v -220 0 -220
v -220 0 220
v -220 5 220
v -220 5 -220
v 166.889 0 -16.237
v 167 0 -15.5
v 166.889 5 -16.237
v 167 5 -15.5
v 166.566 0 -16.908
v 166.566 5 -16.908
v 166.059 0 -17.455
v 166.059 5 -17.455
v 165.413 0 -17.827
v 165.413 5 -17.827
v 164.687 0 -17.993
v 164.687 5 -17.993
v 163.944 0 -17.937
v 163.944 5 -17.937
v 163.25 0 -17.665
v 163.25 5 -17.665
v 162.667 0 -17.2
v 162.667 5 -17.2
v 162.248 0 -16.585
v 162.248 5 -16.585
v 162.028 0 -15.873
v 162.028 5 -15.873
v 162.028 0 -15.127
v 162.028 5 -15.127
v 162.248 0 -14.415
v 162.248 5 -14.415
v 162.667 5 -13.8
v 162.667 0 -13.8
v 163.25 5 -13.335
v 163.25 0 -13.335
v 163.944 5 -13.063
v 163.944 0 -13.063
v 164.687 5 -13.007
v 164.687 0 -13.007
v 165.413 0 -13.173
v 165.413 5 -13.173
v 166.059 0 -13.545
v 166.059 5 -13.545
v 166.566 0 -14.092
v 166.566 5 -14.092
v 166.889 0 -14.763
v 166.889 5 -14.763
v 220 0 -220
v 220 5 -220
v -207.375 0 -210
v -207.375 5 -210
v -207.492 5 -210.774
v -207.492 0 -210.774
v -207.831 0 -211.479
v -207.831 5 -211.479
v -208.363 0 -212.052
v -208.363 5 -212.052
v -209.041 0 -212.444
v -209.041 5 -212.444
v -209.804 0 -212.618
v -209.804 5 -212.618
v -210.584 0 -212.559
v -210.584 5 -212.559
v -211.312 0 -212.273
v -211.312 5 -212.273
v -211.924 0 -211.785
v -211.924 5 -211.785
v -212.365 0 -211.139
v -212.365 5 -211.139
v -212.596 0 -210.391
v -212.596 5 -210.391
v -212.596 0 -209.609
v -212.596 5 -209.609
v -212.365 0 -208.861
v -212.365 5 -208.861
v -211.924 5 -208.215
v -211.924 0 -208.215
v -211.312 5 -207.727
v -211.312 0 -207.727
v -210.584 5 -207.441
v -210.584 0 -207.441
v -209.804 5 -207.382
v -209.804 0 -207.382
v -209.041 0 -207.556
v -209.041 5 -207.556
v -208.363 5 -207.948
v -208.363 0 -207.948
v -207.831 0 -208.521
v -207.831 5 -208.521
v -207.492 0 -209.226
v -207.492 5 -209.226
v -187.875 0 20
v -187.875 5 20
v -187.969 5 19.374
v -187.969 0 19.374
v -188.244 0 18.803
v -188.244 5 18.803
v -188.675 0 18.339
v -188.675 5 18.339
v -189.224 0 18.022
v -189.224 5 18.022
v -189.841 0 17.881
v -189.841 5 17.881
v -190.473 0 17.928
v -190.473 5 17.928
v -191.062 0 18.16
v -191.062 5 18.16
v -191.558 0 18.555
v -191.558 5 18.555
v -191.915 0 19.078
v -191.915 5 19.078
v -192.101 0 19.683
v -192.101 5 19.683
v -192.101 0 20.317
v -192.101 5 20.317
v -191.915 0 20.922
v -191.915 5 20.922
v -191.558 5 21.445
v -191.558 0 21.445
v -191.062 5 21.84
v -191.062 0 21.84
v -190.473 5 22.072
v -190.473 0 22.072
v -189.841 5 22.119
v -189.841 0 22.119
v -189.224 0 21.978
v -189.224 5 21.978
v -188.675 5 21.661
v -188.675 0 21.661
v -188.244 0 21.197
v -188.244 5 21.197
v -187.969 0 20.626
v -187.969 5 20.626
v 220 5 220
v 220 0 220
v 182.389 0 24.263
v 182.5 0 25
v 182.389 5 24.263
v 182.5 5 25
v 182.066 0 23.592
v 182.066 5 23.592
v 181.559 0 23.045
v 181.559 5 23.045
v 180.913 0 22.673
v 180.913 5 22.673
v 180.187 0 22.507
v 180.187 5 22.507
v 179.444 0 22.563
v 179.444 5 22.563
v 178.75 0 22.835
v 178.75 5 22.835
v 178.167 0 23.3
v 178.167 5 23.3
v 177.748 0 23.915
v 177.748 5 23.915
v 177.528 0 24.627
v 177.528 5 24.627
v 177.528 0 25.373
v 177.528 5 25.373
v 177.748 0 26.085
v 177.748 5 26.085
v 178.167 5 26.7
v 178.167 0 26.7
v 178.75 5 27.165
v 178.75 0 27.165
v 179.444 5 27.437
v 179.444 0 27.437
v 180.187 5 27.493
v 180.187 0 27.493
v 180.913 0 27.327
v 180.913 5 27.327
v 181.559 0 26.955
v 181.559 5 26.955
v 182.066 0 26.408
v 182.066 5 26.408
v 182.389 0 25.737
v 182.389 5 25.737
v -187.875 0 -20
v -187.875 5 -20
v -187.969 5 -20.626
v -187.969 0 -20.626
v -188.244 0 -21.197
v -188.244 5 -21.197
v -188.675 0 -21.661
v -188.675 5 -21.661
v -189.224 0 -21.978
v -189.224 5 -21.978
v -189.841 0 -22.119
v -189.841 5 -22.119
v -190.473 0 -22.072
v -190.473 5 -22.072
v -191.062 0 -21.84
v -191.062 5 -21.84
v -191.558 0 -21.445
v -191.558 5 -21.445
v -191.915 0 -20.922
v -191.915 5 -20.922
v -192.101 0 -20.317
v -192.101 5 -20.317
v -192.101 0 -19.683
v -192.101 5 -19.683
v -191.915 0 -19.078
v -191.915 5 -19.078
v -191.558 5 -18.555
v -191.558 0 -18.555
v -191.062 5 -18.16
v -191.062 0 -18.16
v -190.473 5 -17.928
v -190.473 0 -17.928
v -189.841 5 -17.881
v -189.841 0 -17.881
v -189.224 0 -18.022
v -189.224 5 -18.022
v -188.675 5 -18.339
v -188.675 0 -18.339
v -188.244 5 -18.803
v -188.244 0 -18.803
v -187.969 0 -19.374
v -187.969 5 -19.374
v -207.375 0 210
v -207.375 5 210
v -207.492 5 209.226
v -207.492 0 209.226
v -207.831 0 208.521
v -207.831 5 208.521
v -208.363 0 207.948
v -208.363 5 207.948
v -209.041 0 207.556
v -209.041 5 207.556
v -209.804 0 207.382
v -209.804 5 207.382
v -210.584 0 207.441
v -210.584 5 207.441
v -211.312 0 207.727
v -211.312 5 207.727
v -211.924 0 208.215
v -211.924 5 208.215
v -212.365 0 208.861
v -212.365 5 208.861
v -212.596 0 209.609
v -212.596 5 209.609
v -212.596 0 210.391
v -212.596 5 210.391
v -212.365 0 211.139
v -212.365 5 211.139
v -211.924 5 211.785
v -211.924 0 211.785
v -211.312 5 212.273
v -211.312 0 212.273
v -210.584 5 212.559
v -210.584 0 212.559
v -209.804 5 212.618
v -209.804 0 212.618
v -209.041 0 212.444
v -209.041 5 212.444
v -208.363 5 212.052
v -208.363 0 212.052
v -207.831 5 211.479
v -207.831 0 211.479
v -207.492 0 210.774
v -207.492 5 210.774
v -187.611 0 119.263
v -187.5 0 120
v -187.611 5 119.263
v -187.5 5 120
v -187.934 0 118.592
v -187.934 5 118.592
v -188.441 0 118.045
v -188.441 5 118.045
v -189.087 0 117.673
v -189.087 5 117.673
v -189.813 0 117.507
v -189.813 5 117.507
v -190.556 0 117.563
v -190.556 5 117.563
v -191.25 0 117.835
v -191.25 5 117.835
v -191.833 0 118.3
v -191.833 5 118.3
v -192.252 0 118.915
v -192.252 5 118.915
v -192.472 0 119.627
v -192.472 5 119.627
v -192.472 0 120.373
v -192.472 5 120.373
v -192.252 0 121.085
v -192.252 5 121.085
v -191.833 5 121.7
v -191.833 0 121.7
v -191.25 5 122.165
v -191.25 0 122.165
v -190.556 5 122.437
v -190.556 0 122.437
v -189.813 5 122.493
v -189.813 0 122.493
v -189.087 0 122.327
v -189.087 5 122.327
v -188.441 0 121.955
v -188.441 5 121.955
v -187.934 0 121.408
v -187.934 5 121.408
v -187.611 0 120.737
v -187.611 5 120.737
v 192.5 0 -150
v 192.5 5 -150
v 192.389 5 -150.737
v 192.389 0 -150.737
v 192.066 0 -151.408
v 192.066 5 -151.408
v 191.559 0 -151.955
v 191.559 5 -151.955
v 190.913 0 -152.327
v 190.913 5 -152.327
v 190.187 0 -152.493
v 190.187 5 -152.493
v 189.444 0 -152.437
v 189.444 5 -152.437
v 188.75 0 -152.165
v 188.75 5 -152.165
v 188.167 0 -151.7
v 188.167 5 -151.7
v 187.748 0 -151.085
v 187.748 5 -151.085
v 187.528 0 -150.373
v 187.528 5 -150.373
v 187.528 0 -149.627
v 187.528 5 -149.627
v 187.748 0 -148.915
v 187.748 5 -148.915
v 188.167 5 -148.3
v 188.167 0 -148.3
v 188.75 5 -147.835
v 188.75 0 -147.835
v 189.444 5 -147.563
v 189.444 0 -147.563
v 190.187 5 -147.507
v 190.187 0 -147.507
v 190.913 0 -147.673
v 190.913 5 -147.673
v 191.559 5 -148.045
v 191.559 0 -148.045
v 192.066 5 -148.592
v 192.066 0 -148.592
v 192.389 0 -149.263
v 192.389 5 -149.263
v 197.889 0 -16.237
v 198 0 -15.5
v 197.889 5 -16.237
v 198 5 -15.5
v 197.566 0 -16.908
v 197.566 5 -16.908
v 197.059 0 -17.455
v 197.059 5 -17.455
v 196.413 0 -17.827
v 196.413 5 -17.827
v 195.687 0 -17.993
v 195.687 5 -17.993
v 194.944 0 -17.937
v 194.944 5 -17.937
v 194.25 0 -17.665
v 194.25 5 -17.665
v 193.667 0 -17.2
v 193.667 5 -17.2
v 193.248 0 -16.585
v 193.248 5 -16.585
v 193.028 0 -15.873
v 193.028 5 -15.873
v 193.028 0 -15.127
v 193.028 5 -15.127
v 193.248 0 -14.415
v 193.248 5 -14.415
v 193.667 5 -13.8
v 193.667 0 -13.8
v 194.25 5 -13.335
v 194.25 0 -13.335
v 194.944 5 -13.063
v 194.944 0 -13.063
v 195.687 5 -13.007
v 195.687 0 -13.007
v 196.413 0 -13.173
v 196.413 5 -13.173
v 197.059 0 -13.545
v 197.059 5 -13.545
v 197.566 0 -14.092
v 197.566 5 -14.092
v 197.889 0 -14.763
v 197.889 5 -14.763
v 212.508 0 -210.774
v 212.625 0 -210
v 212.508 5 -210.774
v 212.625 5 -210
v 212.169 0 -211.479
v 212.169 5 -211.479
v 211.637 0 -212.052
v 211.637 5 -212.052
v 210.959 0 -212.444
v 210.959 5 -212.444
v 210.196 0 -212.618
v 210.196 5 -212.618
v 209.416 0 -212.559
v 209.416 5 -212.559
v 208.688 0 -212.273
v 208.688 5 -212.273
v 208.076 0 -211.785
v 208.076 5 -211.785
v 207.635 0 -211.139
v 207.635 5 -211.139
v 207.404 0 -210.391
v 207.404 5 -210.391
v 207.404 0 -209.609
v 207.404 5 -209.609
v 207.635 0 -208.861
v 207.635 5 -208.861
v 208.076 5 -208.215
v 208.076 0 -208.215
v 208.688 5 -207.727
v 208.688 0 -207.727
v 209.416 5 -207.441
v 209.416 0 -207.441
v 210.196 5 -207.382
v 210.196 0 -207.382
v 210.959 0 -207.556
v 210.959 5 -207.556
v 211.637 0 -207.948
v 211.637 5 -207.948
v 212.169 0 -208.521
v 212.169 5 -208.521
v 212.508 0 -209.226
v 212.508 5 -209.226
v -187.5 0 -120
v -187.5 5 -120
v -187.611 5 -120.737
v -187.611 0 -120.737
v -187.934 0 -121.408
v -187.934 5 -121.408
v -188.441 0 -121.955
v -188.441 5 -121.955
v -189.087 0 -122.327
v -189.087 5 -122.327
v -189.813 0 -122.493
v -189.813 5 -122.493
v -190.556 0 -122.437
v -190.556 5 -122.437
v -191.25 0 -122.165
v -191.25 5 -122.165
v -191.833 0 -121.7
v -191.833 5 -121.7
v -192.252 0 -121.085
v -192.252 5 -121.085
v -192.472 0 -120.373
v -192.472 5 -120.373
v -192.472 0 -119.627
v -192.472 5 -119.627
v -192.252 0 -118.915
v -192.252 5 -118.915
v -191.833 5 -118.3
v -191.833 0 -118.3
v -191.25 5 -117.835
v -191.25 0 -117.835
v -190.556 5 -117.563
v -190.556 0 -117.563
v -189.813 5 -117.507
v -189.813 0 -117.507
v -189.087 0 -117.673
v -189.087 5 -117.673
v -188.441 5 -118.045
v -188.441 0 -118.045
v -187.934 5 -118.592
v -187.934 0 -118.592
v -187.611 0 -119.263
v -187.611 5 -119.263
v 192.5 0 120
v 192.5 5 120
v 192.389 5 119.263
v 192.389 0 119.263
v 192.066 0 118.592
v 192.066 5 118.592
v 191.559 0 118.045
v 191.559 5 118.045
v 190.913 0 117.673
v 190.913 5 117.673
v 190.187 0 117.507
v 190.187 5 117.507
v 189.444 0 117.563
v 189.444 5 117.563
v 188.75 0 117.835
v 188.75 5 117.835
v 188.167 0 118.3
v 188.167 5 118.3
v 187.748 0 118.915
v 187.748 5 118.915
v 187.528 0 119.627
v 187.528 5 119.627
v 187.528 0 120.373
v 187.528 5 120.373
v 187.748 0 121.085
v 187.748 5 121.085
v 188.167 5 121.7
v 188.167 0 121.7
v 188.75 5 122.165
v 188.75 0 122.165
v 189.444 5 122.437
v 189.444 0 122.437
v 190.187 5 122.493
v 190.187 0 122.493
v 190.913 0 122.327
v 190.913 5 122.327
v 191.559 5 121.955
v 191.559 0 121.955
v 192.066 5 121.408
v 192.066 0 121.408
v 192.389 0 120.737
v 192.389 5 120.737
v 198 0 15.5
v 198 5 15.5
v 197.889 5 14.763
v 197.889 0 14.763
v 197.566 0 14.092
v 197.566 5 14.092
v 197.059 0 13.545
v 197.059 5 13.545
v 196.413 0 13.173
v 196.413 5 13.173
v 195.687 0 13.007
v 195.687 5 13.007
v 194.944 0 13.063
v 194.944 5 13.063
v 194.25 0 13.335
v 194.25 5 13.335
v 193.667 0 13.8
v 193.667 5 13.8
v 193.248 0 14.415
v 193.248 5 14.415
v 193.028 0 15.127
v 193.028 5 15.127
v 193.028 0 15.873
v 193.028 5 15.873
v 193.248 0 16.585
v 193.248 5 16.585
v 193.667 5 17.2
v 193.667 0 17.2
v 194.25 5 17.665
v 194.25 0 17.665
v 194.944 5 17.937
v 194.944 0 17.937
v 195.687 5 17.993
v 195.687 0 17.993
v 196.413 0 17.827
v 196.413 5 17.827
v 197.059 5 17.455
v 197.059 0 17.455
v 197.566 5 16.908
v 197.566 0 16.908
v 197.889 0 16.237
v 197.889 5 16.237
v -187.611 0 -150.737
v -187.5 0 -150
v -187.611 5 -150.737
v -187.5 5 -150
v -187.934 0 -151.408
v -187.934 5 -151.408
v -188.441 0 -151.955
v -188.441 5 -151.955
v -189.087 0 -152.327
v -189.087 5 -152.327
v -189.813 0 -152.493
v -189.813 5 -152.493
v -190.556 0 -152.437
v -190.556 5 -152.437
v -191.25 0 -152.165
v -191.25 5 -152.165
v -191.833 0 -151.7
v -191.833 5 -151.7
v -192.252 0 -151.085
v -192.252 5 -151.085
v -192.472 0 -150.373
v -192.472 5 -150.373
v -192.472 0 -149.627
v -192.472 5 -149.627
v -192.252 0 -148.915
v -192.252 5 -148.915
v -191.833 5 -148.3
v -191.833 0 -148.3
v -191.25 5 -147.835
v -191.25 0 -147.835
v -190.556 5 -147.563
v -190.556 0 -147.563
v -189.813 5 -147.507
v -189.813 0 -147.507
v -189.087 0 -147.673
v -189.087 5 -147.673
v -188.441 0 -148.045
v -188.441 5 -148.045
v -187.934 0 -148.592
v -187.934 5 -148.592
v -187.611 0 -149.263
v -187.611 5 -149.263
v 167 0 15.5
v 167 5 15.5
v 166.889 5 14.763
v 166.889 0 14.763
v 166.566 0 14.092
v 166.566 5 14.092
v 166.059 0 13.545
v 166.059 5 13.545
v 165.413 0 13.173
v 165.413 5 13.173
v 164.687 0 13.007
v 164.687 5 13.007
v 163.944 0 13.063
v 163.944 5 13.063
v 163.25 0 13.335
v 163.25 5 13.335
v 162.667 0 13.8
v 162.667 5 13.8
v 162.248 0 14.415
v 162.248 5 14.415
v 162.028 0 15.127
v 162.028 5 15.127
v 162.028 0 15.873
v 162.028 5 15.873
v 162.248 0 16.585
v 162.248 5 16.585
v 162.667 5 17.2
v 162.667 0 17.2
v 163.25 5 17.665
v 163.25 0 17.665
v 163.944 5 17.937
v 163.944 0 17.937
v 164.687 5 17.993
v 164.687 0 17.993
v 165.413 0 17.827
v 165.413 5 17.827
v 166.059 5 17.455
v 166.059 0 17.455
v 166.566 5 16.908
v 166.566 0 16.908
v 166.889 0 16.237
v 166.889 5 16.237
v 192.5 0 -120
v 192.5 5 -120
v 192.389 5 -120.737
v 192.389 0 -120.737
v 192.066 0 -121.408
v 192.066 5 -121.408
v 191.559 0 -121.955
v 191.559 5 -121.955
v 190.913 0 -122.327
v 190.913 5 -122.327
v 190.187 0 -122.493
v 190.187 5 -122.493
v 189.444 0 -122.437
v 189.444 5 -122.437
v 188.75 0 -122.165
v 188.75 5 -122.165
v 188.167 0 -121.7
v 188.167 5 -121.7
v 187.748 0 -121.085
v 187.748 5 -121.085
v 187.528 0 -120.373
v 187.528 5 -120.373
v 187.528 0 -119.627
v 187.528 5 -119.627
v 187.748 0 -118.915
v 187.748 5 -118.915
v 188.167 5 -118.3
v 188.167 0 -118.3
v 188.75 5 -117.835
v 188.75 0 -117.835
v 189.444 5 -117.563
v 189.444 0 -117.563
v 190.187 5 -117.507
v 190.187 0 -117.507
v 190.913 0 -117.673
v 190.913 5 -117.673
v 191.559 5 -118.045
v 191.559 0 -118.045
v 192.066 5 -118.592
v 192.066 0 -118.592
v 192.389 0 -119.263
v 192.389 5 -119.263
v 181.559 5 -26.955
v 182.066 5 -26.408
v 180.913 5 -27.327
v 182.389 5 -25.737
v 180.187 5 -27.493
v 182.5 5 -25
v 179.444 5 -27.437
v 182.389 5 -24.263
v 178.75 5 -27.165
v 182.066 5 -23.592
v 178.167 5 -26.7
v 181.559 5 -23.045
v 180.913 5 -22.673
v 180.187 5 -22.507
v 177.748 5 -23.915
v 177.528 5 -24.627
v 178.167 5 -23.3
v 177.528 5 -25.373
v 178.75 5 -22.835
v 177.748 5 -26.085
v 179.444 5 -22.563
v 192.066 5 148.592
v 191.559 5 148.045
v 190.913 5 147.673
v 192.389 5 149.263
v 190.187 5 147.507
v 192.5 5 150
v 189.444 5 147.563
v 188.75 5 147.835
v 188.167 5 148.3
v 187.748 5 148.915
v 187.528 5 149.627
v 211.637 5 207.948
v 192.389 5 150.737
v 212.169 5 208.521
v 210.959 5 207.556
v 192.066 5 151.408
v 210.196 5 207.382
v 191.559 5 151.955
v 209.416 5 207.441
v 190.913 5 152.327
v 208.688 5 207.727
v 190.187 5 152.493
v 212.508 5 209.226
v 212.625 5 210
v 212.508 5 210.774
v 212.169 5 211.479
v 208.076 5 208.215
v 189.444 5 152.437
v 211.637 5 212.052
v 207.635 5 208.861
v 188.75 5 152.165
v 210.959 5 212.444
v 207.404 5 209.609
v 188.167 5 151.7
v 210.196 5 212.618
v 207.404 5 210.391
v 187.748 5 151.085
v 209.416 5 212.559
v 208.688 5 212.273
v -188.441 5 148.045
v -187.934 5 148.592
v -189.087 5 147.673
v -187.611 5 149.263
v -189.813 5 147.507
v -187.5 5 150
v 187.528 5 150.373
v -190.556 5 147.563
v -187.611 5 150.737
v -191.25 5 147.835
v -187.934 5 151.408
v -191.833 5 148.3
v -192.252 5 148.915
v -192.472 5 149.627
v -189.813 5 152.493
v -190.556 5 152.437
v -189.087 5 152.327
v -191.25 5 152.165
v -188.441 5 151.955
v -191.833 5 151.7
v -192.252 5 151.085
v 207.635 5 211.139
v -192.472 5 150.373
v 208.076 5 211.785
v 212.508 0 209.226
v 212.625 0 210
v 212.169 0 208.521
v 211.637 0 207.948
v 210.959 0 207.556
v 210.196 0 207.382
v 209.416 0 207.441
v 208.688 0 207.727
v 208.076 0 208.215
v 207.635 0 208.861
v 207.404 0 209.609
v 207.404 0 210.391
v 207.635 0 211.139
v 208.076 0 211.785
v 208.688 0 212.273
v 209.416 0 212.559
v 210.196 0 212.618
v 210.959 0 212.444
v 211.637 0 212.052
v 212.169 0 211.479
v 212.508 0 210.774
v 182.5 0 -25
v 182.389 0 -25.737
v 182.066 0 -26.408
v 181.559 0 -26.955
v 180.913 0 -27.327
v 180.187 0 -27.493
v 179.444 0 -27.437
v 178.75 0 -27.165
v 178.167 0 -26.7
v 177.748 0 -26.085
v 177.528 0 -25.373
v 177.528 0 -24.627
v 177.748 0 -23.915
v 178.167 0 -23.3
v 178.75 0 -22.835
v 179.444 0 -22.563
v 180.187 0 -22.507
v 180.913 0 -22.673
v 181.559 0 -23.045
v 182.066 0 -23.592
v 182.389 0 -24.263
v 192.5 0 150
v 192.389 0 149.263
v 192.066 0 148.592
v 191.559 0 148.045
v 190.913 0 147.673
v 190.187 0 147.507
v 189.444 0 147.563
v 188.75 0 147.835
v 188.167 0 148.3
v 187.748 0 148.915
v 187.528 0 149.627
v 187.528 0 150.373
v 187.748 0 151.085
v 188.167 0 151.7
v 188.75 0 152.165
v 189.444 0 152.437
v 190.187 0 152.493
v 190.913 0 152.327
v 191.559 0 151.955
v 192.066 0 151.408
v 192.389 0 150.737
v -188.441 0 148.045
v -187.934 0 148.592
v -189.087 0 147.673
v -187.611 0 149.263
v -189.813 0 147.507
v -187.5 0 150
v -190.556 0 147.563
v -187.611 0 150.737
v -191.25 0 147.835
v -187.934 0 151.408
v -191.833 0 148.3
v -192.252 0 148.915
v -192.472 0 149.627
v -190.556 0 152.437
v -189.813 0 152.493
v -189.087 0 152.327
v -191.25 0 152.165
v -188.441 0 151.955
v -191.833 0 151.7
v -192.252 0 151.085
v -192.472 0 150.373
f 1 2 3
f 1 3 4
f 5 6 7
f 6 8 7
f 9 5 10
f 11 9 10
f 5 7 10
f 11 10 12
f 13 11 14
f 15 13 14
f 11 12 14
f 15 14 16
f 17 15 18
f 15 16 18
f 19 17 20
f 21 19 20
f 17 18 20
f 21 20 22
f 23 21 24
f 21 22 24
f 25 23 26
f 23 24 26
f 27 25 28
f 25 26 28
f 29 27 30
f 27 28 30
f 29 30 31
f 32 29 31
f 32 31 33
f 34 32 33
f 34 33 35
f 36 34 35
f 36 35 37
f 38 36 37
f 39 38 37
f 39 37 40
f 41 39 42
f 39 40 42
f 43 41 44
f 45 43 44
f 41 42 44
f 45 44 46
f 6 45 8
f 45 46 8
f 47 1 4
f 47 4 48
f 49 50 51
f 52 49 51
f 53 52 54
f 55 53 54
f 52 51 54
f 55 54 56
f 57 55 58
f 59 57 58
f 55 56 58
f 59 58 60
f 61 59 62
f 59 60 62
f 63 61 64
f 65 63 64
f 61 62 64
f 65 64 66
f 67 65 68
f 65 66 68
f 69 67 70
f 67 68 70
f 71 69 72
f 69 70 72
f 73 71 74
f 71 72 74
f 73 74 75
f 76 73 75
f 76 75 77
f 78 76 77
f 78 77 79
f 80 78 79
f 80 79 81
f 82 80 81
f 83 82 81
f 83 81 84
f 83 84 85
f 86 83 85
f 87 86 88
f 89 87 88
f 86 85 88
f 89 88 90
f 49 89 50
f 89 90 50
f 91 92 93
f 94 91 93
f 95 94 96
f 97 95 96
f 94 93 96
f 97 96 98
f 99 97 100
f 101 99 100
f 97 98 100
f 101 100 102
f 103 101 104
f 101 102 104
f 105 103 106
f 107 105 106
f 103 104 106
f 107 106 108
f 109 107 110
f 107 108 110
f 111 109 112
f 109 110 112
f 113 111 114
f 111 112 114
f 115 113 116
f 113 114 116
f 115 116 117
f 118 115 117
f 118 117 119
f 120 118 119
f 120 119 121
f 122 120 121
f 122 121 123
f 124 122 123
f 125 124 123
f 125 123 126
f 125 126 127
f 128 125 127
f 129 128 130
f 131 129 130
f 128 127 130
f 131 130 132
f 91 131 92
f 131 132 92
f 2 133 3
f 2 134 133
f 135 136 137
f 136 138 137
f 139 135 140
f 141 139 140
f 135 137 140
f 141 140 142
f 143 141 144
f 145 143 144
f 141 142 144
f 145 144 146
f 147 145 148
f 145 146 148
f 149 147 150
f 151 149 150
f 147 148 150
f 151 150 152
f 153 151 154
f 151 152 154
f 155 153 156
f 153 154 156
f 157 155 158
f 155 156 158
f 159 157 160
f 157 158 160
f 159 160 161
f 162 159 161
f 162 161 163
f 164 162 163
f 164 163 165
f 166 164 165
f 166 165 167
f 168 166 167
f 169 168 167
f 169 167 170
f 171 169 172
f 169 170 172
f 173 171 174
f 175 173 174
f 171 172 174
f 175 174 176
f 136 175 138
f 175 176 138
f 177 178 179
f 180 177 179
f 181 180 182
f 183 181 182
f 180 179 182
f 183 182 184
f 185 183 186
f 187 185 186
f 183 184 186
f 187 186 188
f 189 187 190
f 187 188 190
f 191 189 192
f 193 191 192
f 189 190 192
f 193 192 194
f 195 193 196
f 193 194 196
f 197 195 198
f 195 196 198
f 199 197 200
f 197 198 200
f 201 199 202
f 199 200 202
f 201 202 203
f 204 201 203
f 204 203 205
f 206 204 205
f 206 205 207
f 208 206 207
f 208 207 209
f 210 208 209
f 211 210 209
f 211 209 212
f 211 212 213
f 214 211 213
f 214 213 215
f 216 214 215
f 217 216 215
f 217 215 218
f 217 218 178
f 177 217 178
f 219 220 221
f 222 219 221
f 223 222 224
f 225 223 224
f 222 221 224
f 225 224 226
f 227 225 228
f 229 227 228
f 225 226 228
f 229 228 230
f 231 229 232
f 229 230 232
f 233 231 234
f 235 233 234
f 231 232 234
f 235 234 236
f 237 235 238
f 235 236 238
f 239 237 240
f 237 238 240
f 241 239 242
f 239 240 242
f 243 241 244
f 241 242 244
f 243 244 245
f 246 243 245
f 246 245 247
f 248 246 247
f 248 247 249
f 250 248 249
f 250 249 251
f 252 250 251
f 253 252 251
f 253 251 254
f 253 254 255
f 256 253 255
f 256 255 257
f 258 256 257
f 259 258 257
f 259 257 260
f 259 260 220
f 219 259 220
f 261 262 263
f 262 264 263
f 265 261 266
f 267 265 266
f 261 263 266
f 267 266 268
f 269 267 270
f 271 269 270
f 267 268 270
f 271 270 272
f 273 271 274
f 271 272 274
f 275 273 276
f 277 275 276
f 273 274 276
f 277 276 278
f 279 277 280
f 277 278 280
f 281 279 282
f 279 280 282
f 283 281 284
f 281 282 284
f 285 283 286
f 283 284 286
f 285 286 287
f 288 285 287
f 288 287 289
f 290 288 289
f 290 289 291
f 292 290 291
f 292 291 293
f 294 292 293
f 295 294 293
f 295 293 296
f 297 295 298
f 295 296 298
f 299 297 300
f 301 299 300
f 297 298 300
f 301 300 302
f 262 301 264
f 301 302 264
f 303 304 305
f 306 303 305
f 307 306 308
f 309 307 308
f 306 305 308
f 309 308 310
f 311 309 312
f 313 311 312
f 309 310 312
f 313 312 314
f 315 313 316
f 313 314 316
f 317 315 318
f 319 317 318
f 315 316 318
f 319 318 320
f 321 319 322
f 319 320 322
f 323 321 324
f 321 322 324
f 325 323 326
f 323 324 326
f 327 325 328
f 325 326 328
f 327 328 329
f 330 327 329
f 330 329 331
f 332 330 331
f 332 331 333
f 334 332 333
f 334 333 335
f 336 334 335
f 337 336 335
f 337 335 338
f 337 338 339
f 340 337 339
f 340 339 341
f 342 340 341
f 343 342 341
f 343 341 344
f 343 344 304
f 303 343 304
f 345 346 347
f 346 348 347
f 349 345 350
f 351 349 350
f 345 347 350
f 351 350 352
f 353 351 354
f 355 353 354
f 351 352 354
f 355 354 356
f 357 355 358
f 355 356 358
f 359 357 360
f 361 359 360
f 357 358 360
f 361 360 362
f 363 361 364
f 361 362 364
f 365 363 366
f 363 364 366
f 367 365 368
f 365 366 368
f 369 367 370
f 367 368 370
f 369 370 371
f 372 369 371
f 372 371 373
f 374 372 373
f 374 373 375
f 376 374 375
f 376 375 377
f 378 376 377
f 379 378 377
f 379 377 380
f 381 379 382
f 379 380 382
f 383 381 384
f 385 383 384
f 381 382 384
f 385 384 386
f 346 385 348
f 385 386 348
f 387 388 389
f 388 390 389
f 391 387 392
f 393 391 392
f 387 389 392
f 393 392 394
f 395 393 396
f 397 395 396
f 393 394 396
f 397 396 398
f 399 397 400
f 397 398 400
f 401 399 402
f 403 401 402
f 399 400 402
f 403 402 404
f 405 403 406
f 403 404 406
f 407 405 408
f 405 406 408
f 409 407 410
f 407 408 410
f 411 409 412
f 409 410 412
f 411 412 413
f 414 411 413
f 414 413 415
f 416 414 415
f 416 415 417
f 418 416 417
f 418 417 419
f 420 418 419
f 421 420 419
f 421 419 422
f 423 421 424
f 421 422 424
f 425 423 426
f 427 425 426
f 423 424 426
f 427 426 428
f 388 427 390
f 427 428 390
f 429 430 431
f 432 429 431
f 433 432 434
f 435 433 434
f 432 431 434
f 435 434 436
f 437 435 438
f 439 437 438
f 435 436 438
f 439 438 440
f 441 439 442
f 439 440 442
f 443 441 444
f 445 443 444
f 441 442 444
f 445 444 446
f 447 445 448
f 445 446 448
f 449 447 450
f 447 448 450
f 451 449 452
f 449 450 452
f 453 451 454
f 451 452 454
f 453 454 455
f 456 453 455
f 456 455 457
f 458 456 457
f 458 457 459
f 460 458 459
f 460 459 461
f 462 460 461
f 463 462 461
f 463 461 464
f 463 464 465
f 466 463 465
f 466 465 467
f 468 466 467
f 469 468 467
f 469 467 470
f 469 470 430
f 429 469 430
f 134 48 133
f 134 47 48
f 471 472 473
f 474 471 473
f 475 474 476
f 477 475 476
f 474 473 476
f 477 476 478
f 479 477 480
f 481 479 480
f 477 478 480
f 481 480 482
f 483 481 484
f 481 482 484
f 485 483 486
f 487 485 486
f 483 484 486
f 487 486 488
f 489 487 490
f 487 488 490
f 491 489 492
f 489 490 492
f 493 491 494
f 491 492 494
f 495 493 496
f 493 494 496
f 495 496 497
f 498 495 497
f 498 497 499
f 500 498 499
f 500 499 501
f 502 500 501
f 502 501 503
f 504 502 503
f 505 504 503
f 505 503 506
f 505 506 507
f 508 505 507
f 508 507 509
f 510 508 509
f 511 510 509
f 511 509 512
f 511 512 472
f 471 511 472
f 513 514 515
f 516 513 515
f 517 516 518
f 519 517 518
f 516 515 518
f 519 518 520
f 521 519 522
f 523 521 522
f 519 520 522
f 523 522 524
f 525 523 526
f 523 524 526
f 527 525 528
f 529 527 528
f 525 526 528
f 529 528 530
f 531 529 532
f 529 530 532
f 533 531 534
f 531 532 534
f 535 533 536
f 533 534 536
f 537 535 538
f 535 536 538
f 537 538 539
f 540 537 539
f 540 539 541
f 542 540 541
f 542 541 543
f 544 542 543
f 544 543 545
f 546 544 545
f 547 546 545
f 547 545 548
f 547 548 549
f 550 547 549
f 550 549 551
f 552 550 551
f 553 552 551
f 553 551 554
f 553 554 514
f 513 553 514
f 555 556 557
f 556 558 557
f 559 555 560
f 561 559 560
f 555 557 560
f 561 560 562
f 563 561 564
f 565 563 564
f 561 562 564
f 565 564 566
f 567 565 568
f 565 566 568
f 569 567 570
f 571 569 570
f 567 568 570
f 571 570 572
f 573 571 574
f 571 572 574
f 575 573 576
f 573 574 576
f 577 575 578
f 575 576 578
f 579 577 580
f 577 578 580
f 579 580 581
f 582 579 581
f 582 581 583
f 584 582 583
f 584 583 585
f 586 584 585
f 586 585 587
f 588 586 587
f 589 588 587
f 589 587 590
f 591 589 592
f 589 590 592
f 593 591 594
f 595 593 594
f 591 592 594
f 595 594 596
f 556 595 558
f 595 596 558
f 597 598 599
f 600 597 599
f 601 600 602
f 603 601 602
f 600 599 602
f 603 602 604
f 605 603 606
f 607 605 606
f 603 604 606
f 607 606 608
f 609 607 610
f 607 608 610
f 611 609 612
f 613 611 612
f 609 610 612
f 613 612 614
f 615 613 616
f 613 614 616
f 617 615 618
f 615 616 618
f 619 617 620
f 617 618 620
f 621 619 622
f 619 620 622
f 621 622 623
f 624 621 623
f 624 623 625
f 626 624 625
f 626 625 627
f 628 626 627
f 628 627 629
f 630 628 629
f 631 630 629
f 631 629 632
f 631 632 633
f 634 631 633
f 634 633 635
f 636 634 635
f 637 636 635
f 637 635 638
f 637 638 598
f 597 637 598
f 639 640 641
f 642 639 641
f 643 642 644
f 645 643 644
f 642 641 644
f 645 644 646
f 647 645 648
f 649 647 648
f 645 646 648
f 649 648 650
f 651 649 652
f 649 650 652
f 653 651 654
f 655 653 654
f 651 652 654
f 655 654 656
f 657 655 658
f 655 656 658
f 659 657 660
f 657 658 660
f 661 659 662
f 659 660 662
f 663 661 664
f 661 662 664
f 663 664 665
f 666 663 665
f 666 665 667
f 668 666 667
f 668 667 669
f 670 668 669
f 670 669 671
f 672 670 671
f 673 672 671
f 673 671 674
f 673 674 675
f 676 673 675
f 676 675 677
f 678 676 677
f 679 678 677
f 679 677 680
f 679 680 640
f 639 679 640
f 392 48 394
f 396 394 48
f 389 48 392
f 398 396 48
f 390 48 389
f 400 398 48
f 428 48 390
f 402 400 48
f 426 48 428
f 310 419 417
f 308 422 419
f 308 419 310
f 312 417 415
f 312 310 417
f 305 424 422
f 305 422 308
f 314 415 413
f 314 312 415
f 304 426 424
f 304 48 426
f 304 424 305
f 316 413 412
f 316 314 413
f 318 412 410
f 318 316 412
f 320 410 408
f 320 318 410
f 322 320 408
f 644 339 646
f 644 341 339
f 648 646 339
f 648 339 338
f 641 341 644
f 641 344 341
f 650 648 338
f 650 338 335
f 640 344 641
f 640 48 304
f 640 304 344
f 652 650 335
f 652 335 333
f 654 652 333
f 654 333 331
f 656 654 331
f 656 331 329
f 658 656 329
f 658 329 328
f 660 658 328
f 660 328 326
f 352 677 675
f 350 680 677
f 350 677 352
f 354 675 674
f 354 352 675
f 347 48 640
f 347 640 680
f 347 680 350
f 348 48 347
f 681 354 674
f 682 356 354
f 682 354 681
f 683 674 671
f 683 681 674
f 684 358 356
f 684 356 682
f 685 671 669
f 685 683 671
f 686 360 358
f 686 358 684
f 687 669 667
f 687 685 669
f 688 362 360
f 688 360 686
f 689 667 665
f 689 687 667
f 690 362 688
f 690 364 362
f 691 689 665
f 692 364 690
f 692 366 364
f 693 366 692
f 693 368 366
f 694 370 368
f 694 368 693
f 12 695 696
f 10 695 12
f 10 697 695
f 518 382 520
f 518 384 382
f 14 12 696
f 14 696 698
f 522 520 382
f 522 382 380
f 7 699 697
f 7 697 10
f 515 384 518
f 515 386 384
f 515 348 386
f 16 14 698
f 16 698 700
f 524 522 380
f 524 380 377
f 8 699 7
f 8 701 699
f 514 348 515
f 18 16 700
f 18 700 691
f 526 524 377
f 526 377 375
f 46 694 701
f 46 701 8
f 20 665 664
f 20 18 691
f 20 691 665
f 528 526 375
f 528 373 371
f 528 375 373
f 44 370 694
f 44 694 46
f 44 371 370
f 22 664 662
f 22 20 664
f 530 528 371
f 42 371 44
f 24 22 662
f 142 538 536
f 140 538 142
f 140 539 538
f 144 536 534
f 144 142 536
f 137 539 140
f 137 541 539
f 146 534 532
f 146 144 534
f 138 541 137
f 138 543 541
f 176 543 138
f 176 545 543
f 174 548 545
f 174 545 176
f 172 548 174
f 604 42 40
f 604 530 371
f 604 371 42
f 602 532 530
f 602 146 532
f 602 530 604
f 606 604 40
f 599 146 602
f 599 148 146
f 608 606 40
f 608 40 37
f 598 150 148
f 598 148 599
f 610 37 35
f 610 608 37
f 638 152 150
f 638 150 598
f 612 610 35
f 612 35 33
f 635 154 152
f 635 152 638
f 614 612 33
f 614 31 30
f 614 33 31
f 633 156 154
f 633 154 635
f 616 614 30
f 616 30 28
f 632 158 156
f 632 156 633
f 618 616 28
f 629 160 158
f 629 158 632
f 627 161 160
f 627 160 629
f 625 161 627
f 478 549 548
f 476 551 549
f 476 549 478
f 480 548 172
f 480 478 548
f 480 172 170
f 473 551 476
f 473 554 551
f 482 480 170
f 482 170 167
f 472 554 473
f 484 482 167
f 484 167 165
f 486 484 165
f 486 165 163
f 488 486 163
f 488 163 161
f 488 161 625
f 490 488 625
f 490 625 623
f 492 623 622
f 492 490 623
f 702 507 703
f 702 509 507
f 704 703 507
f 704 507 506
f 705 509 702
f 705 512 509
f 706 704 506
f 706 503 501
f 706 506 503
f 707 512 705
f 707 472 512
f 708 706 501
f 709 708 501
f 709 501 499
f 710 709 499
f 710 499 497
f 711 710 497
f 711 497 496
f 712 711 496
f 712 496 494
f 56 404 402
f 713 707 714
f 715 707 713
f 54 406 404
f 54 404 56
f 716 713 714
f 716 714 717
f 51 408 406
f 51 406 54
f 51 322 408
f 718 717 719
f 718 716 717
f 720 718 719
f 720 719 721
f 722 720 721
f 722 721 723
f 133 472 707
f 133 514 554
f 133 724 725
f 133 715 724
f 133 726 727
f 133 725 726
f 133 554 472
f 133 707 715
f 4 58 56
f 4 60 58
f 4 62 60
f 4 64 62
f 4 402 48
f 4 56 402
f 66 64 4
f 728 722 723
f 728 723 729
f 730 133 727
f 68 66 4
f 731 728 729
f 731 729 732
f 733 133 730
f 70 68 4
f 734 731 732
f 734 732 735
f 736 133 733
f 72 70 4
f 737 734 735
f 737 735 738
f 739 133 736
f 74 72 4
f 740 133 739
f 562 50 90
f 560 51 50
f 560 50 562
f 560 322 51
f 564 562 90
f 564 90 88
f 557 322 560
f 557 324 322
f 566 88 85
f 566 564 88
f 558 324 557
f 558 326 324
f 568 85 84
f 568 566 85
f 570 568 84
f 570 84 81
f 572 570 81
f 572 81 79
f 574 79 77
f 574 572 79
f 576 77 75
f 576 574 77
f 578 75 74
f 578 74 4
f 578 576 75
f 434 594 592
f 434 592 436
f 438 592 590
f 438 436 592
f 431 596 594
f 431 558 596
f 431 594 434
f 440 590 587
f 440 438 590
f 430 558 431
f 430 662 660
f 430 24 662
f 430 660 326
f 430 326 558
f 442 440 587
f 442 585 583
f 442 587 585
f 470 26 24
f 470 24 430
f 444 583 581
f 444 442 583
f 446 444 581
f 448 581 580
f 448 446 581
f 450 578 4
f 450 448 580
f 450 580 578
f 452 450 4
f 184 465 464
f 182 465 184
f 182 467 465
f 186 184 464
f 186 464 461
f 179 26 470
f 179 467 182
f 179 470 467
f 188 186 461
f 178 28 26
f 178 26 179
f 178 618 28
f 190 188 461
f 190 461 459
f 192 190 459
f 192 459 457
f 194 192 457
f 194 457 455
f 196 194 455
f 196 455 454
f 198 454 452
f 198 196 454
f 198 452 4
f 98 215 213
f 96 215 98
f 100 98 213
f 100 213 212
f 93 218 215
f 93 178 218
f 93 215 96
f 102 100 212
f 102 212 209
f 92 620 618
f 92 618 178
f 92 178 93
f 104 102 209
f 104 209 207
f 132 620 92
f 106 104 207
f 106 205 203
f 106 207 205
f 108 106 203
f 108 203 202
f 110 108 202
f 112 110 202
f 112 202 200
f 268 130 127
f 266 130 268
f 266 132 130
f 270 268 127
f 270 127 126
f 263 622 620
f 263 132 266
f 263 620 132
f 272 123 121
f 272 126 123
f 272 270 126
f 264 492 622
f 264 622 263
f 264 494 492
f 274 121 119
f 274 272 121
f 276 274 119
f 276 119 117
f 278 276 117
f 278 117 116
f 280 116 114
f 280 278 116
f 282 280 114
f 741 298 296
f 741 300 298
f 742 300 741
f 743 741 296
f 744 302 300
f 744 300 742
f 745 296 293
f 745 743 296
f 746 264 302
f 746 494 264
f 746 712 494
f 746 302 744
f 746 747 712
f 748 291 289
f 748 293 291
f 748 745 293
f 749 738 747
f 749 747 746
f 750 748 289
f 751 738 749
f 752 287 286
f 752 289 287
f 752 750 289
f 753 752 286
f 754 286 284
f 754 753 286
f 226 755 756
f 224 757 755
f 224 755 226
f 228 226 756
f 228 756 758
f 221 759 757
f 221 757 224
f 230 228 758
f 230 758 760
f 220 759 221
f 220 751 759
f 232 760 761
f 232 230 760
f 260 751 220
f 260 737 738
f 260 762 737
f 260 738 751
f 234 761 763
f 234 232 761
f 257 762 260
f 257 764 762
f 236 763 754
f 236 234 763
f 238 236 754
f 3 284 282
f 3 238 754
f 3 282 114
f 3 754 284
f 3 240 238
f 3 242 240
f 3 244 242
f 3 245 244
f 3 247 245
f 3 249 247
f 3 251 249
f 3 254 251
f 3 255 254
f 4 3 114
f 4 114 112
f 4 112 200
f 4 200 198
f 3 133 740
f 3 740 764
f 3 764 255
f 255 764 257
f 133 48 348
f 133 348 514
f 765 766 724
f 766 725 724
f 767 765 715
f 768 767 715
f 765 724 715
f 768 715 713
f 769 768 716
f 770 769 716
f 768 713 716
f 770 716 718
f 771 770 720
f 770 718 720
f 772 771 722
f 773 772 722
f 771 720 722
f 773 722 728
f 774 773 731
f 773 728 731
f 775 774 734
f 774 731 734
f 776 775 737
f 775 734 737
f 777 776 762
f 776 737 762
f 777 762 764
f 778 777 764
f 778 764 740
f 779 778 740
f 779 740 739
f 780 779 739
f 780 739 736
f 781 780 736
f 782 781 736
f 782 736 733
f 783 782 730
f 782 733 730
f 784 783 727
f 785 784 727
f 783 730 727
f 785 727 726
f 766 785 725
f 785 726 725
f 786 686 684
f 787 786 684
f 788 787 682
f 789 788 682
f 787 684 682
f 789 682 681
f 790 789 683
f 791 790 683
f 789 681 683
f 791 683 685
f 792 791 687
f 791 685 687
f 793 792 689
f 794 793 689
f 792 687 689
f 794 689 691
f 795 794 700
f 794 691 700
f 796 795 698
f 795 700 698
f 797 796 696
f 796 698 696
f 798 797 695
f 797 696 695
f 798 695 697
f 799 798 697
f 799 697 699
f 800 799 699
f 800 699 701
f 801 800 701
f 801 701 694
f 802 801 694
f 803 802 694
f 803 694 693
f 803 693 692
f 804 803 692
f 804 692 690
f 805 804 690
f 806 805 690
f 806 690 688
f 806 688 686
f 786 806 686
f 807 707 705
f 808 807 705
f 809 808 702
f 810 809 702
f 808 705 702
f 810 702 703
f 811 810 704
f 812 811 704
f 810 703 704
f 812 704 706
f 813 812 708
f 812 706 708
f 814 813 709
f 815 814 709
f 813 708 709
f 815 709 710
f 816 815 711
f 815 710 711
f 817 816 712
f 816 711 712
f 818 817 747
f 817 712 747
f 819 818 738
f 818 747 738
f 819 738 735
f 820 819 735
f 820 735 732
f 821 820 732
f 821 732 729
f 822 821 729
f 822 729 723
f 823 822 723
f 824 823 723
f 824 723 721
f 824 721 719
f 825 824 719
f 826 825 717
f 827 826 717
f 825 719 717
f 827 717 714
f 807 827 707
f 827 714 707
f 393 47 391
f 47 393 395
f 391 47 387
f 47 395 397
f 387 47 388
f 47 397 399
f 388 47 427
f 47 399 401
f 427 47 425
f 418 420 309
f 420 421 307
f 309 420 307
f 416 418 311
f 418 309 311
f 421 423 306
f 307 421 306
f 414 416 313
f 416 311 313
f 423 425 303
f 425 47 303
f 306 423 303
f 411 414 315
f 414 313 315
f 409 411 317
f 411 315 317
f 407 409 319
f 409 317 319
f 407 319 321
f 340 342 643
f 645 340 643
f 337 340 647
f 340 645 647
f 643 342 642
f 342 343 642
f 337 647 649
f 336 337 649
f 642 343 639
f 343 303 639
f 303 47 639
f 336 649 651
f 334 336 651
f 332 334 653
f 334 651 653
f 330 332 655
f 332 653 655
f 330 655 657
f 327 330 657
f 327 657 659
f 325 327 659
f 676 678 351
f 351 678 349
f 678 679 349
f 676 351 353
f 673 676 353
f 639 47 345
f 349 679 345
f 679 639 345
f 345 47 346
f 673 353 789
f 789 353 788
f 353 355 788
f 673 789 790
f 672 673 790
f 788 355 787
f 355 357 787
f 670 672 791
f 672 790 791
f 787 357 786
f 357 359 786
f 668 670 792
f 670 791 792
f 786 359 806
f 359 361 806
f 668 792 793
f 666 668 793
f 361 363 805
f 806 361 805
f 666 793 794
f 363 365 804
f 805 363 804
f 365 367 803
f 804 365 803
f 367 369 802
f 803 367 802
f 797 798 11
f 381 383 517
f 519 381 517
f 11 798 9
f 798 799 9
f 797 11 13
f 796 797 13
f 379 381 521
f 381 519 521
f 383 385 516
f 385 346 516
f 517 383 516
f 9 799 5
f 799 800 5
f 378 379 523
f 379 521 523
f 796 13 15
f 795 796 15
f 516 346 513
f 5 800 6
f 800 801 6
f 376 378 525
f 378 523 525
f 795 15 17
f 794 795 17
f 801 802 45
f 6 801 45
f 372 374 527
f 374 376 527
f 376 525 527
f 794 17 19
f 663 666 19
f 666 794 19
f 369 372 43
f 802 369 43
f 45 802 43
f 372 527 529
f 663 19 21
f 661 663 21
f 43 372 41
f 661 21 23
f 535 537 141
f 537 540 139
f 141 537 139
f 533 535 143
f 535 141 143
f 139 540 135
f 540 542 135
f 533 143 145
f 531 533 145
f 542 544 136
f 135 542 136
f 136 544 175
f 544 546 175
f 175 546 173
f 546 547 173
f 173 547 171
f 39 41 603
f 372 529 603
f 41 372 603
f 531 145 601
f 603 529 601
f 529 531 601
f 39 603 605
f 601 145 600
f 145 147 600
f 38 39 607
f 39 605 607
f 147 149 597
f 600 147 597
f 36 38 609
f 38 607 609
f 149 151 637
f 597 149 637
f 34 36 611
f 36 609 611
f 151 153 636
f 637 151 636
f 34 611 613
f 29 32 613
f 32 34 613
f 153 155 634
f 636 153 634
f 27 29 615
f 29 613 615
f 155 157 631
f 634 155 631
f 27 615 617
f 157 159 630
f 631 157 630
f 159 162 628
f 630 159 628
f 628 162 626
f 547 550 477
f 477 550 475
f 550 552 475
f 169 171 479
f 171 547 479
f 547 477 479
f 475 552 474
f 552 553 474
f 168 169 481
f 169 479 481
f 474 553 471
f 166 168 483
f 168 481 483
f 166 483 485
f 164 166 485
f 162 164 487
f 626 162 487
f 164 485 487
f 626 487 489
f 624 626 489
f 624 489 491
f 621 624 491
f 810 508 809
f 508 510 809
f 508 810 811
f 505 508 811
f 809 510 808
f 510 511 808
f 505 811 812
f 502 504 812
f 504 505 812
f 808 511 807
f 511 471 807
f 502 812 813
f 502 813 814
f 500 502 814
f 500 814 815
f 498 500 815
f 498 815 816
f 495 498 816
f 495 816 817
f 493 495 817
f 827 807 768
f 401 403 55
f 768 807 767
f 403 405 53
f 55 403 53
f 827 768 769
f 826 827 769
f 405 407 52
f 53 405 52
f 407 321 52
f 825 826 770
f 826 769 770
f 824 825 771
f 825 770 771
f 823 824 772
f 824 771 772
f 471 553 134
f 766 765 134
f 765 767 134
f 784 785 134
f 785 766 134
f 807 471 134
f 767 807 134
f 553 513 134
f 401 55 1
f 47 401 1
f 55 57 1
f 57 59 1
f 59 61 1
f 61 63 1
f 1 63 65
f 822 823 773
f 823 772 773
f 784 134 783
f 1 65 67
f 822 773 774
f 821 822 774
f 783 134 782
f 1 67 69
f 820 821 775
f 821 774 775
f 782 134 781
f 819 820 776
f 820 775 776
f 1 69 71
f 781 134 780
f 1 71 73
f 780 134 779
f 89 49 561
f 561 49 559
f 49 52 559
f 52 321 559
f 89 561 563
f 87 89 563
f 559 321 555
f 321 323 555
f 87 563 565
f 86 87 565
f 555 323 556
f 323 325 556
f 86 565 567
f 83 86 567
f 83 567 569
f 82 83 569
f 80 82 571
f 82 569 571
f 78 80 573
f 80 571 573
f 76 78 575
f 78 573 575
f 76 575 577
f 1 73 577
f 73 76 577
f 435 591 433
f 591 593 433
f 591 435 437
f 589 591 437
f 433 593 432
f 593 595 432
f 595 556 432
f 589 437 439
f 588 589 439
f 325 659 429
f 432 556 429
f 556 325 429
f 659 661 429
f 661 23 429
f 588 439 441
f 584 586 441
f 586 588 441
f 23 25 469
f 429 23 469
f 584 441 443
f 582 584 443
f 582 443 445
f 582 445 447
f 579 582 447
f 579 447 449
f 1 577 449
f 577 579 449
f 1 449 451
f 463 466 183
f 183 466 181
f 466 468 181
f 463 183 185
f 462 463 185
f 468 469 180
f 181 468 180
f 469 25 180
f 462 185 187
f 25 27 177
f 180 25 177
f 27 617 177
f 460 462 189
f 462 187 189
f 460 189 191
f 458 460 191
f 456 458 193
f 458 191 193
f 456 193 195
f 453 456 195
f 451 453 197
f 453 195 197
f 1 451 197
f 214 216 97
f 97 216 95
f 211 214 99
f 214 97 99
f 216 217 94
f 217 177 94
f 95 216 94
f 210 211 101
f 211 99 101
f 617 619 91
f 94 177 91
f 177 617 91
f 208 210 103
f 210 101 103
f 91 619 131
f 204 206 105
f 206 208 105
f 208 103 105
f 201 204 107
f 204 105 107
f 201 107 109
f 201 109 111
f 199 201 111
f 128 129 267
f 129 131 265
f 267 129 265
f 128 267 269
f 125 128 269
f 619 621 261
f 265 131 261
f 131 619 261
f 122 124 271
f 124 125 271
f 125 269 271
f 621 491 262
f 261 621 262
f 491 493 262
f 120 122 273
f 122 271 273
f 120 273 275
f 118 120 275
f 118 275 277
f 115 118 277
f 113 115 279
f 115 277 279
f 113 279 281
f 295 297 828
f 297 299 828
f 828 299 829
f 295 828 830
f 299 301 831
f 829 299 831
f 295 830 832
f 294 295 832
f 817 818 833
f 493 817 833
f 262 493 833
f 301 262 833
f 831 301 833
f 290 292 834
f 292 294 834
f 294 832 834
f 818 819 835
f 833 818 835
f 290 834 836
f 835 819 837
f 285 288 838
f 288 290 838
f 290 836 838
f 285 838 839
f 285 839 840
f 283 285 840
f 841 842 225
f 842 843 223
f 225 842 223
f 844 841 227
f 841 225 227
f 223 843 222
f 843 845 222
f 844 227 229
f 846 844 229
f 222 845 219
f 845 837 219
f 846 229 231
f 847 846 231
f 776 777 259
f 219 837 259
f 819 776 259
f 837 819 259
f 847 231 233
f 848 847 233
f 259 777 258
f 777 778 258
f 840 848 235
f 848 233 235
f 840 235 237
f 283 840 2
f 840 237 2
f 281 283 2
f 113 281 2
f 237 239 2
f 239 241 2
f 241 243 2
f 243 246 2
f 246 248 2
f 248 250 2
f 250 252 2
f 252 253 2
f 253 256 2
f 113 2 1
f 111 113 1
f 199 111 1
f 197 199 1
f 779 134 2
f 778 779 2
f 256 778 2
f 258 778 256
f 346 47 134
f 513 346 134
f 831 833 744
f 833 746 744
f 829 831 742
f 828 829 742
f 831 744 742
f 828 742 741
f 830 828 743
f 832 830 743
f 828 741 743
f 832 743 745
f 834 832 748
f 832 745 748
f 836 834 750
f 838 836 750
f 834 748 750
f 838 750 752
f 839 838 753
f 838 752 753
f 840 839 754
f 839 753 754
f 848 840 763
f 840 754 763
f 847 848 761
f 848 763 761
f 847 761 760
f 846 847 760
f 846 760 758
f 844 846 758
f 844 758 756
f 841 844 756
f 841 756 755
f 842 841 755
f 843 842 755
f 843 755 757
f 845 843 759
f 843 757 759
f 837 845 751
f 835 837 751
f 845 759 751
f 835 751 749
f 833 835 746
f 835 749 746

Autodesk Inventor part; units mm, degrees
ref_plane "YZ Plane" through (0, 0, 0) normal (1, 0, 0) x (0, 1, 0)
ref_plane "XZ Plane" through (0, 0, 0) normal (0, 1, 0) x (-1, 0, 0)
ref_plane "XY Plane" through (0, 0, 0) normal (0, 0, 1) x (1, 0, 0)
sketch "Sketch1" plane through (0, 0, 0) normal (0, 1, 0) x (-1, 0, 0)
  line L0 (220, -220) -> (-220, -220)
  line L1 (-220, -220) -> (-220, 220)
  line L2 (-220, 220) -> (220, 220)
  line L3 (220, 220) -> (220, -220)
  line L4 (160, -160) -> (-160, -160)
  line L5 (-160, -160) -> (-160, 160)
  line L6 (-160, 160) -> (160, 160)
  line L7 (160, 160) -> (160, -160)
  line L8 (0, 42.2223) -> (0, -35.1237) construction
  line L9 (40.4991, 0) -> (-29.63, 0) construction
  point P0 (0, 0)
  dimension "d0" = 440
  dimension "d1" = 320
  dimension "d2" = 320
  dimension "d3" = 440
extrude "Extrusion1" add sketch "Sketch1" along normal blind 5 contours L0 L1 L2 L3 | L4 L5 L6 L7
sketch "Sketch3" plane through (0, 5, 0) normal (0, 1, 0) x (1, 0, 0)
  circle A0 centre (-190, -150) radius 2.5
  circle A1 centre (-190, -120) radius 2.5
  circle A2 centre (-190, -20) radius 2.125
  circle A3 centre (-190, 20) radius 2.125
  circle A4 centre (-190, 120) radius 2.5
  circle A5 centre (-190, 150) radius 2.5
  circle A6 centre (190, 120) radius 2.5
  circle A7 centre (190, 150) radius 2.5
  circle A8 centre (190, -150) radius 2.5
  circle A9 centre (190, -120) radius 2.5
  circle A10 centre (180, -25) radius 2.5
  circle A11 centre (195.5, -15.5) radius 2.5
  circle A12 centre (195.5, 15.5) radius 2.5
  circle A13 centre (180, 25) radius 2.5
  circle A14 centre (164.5, -15.5) radius 2.5
  circle A15 centre (164.5, 15.5) radius 2.5
  circle A16 centre (210, 210) radius 2.625
  circle A17 centre (210, -210) radius 2.625
  circle A18 centre (-210, -210) radius 2.625
  circle A19 centre (-210, 210) radius 2.625
  line L0 (210, 210) -> (210, -210) construction
  line L1 (210, -210) -> (-210, -210) construction
  line L2 (-210, -210) -> (-210, 210) construction
  line L3 (-210, 210) -> (210, 210) construction
  line L4 (210, 171.5822) -> (220, 171.5822)
  line L5 (220, -220) -> (220, 220) projected
  line L6 (-210, 160.3384) -> (-220, 160.3384)
  line L7 (-220, 220) -> (-220, -220) projected
  line L8 (220, 220) -> (-220, 220) projected
  line L9 (-109.669, 220) -> (-109.669, 210)
  line L10 (-109.2567, -210) -> (-109.2567, -220)
  dimension "d28" = 5.25
  dimension "d29" = 5.25
  dimension "d30" = 5.25
  dimension "d31" = 5.25
  dimension "d32" = 10
extrude "Extrusion2" cut sketch "Sketch3" against normal through all
properties part number "Floor"
